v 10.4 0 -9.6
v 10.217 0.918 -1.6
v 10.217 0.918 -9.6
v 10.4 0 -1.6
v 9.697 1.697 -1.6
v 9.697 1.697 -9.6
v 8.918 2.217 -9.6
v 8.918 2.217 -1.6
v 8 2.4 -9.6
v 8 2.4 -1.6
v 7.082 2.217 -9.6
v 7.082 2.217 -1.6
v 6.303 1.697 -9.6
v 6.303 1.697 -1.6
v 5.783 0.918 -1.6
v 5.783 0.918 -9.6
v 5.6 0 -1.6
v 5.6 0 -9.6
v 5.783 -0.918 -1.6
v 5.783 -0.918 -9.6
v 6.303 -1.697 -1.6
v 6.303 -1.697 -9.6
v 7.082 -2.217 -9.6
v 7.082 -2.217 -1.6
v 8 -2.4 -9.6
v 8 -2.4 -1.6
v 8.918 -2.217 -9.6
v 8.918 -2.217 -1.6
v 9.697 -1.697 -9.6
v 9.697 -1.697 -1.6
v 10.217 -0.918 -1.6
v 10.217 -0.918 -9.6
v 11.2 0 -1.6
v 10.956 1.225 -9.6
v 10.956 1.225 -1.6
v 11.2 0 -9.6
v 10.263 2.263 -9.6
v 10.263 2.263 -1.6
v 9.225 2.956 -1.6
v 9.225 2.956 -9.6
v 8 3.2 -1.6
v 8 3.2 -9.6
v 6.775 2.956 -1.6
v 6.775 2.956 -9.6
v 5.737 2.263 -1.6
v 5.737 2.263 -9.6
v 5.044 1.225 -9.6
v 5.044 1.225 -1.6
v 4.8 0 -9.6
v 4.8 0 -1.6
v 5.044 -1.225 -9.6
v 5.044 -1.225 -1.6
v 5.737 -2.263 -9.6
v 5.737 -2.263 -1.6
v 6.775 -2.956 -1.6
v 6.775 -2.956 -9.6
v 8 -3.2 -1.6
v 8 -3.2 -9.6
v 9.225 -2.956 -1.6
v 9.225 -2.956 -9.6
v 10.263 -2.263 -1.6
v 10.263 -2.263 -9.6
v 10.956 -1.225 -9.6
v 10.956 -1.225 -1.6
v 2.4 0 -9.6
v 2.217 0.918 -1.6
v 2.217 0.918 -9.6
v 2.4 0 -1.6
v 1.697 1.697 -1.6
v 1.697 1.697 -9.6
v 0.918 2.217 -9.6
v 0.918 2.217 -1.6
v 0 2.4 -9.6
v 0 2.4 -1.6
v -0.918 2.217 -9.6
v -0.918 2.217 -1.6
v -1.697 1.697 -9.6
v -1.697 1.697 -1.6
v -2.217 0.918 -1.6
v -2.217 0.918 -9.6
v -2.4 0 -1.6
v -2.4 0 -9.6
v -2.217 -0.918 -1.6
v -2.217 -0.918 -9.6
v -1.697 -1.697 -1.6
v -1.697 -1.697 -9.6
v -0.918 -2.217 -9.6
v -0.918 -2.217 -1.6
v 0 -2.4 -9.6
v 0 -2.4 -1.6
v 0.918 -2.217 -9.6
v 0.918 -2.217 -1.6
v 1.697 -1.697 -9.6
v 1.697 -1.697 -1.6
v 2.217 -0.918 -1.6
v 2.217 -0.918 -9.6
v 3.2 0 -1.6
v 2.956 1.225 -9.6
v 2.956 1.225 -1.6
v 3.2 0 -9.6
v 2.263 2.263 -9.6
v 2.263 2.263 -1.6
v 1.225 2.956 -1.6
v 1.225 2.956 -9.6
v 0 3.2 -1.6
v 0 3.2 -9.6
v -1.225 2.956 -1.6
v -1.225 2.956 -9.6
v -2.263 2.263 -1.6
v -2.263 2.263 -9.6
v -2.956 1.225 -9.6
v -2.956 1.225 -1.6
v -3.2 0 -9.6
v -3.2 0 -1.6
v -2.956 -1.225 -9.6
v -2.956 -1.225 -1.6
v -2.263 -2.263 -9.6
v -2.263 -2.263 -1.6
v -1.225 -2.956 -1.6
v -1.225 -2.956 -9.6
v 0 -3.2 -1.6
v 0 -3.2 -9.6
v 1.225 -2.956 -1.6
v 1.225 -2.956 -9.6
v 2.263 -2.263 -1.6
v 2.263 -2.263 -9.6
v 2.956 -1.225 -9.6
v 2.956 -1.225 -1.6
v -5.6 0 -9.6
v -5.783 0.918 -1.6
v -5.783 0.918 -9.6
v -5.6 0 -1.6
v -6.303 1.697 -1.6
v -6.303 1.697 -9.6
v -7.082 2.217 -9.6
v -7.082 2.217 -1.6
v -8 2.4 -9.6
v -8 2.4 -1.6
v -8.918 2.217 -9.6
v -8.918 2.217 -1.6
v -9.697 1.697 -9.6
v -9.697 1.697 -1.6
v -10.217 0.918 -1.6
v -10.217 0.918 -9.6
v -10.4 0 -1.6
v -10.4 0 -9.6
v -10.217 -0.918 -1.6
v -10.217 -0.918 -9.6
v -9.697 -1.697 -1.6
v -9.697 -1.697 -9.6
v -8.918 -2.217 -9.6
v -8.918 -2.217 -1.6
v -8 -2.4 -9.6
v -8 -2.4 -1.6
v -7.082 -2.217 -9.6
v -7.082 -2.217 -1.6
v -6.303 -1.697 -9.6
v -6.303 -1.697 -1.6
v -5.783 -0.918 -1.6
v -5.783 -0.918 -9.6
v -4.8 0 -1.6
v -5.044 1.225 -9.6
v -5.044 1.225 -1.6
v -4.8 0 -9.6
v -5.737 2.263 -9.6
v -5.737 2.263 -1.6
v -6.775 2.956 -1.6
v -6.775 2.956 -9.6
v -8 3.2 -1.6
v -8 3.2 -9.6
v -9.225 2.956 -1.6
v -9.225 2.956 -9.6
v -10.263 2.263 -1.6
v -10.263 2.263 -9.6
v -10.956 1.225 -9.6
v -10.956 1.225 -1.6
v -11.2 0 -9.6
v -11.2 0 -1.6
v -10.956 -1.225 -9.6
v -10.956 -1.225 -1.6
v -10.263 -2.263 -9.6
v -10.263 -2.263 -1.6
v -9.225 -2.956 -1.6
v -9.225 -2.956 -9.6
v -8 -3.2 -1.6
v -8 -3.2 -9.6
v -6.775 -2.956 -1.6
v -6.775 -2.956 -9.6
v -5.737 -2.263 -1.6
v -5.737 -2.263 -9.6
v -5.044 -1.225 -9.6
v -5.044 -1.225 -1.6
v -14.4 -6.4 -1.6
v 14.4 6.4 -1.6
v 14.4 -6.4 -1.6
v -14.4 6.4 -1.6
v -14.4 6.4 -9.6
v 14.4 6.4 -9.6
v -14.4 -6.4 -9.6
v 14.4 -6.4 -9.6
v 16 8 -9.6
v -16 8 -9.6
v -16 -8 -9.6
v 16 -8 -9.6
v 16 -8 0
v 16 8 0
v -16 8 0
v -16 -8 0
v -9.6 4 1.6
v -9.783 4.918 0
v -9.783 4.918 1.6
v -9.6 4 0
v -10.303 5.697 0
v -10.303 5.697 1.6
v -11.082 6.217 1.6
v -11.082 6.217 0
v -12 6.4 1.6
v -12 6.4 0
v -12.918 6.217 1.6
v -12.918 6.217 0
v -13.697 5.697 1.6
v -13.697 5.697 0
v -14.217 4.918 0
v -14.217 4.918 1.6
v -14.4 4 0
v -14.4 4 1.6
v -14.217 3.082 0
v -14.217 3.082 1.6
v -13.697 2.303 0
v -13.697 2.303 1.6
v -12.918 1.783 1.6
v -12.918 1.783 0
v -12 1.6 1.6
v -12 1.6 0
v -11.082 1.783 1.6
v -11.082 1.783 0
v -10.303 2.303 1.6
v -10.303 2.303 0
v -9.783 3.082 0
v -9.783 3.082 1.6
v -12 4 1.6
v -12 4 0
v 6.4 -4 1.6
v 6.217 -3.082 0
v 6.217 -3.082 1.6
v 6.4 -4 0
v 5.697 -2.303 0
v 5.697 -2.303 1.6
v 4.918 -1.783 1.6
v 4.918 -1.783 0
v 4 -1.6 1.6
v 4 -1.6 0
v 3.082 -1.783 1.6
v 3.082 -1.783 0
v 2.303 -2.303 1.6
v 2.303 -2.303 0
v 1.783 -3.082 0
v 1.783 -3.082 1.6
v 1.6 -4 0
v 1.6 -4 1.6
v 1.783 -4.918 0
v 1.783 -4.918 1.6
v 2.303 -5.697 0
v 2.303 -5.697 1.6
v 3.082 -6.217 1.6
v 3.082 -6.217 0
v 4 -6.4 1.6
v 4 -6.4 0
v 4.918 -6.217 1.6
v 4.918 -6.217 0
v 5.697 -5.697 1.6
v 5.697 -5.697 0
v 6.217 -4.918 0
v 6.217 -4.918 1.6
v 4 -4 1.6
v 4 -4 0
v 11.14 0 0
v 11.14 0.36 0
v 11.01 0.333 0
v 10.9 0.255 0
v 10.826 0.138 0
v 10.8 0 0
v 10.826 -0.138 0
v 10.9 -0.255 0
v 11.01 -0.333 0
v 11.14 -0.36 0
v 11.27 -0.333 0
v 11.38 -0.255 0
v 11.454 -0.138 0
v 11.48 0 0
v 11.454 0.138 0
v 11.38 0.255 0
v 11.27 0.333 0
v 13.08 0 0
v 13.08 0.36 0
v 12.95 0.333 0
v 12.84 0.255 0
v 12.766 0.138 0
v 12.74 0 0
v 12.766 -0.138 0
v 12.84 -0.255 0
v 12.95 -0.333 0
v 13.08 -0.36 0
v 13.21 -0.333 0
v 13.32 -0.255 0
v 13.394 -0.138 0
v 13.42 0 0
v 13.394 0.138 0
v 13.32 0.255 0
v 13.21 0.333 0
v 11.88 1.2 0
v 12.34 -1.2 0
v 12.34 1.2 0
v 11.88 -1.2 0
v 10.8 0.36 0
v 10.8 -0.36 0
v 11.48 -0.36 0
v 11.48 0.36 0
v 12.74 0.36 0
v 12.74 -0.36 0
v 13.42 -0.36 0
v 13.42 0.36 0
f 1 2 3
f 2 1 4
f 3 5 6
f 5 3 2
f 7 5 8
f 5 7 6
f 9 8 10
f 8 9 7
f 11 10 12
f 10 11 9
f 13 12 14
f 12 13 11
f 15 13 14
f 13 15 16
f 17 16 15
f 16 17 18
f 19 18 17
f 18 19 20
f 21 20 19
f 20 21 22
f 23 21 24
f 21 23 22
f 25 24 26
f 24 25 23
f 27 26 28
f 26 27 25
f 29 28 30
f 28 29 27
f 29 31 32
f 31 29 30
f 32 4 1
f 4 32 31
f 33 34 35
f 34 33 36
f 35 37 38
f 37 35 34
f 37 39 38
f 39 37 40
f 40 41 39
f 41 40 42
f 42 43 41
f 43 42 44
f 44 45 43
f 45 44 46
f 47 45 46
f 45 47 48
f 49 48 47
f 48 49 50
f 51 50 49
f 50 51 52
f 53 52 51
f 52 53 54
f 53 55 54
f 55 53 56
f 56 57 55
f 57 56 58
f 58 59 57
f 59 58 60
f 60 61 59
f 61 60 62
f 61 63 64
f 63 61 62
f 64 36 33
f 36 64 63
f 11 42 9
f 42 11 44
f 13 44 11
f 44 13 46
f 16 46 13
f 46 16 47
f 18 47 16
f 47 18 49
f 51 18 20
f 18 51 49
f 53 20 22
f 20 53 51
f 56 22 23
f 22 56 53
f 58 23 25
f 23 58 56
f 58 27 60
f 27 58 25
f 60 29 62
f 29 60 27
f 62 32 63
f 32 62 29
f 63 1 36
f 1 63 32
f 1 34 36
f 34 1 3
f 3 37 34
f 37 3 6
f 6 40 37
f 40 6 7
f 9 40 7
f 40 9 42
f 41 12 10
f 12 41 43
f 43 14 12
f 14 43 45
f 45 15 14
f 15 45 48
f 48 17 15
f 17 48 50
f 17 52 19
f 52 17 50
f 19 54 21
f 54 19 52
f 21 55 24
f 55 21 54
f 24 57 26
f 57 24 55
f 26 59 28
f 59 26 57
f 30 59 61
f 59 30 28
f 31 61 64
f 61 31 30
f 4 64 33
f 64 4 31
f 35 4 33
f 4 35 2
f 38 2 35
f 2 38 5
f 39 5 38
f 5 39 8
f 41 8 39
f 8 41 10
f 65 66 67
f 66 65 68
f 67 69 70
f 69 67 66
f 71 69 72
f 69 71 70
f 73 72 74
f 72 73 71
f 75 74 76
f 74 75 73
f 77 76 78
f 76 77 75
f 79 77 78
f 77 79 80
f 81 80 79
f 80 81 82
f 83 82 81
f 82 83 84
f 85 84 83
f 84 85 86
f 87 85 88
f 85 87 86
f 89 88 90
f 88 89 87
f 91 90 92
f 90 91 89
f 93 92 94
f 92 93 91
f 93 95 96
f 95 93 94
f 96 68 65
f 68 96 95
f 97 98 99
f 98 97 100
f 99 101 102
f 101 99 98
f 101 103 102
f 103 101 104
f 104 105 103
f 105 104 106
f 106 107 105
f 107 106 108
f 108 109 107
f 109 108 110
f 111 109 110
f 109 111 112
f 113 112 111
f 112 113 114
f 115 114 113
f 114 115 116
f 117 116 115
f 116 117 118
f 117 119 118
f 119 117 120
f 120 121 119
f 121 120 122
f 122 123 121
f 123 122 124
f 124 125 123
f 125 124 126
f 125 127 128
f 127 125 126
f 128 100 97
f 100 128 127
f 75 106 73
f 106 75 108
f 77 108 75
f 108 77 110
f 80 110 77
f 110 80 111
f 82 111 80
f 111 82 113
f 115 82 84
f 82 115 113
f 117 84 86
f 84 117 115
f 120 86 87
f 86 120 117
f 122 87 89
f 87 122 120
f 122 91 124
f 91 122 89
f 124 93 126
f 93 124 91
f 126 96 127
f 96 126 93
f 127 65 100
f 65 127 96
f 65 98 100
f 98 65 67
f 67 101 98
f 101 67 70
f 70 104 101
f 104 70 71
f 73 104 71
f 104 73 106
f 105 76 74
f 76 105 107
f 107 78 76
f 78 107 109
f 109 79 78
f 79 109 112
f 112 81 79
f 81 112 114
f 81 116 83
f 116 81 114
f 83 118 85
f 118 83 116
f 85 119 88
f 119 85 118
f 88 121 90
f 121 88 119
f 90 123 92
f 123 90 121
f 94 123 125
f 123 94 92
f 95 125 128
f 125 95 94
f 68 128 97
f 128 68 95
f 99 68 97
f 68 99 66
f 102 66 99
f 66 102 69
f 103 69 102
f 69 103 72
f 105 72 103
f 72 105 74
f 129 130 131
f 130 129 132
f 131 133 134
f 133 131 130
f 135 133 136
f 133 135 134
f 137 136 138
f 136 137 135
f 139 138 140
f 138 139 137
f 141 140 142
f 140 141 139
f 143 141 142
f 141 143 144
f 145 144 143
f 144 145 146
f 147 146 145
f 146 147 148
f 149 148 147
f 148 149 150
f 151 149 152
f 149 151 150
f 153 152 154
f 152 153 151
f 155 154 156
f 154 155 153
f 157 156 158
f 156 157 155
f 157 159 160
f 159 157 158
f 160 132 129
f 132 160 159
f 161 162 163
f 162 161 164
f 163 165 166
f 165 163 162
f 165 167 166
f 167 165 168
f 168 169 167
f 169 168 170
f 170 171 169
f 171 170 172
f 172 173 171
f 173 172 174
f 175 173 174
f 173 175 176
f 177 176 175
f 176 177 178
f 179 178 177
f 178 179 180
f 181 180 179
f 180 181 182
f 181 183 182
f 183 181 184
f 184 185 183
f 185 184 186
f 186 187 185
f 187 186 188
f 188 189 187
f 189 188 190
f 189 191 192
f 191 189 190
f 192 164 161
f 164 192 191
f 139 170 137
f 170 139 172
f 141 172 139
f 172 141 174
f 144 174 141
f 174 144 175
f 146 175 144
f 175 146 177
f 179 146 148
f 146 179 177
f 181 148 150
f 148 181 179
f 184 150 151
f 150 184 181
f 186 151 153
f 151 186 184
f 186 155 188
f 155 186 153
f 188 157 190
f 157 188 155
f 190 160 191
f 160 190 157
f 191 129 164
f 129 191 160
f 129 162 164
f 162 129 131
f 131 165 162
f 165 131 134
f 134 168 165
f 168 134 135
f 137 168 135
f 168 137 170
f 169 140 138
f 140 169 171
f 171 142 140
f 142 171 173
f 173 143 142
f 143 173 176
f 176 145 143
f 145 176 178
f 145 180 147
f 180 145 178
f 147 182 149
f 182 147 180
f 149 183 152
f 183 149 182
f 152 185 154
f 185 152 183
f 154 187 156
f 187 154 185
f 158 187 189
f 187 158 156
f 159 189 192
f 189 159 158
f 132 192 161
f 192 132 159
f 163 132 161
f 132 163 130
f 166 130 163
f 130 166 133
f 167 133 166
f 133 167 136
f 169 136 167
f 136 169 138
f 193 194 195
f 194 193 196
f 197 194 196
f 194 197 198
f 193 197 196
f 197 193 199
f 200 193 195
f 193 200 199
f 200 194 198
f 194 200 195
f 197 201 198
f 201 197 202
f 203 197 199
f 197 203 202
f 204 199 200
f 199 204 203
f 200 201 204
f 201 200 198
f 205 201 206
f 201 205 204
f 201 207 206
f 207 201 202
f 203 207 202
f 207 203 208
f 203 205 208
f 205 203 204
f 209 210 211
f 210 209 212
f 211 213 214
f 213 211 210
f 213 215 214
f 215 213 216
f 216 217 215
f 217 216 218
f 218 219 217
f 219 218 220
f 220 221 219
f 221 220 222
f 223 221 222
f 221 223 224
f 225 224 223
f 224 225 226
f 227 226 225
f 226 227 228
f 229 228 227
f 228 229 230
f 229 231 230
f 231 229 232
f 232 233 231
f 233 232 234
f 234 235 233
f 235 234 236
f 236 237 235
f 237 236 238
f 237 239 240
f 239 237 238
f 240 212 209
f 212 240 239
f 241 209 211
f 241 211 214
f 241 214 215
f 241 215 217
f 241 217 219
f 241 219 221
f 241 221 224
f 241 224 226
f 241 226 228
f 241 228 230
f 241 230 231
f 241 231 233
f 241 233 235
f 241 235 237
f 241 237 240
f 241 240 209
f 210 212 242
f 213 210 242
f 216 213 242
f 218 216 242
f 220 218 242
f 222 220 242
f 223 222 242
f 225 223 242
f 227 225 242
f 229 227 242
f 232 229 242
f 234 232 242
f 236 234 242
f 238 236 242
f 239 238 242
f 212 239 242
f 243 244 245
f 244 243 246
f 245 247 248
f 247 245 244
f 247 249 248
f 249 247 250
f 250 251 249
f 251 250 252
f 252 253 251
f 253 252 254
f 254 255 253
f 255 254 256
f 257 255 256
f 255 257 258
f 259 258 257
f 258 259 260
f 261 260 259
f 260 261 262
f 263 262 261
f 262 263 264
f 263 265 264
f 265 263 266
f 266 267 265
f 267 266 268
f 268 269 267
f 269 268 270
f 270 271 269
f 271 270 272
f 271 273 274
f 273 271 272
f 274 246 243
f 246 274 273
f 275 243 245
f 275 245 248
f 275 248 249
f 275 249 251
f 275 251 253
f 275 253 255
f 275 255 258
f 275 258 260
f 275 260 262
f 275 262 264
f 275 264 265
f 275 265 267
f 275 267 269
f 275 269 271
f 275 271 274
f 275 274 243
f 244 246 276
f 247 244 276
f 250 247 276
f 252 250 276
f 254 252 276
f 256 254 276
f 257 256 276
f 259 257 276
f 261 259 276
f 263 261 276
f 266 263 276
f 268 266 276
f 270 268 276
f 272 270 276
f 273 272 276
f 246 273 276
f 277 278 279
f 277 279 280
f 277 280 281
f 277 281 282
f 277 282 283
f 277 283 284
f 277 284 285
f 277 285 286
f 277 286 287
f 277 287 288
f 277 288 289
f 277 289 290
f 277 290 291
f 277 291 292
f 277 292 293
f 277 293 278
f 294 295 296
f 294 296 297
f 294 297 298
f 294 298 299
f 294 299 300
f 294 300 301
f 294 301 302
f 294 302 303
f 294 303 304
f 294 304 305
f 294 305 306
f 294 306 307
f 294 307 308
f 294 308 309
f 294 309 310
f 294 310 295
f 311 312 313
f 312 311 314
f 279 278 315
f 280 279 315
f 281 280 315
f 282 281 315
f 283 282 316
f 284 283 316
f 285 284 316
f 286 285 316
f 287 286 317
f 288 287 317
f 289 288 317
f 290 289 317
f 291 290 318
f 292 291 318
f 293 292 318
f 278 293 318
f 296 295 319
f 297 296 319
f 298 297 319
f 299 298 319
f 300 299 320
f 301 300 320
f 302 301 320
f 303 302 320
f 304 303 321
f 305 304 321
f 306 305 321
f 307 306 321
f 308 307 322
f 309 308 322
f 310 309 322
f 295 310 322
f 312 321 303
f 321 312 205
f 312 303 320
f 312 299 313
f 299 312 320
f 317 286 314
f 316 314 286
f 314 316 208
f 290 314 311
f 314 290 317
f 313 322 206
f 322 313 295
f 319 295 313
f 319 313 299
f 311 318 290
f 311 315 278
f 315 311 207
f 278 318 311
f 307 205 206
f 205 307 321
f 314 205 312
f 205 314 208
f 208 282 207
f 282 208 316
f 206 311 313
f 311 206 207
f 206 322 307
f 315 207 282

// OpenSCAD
// file: ../p/4-4ring3.scad
use <../lib.scad>
$fa=1; $fs=0.2;
function ldraw_lib__4_4ring3(realsolid=false) = [
// 0 Ring  3 x 1.0
// 0 Name: 4-4ring3.dat
// 0 Author: James Jessiman
// 0 !LDRAW_ORG Primitive UPDATE 2009-01
// 0 !LICENSE Licensed under CC BY 2.0 and CC BY 4.0 : see CAreadme.txt
// 
// 0 BFC CERTIFY CCW
  [0,"BFC","CERTIFY"],
  [0,"BFC","CCW"],
// 
// 0 !HISTORY 1998-12-15 [PTadmin] Official Update 1998-10
// 0 !HISTORY 2002-04-05 [hafhead] Added BFC statement
// 0 !HISTORY 2002-04-25 [PTadmin] Official Update 2002-02
// 0 !HISTORY 2007-06-24 [PTadmin] Header formatted for Contributor Agreement
// 0 !HISTORY 2008-07-01 [PTadmin] Official Update 2008-01
// 0 !HISTORY 2008-08-26 [cwdee] Switch polygon winding and rename
// 0 !HISTORY 2009-05-02 [PTadmin] Official Update 2009-01
// 
// 
// 4 16 -1.5308 0 3.6956 -1.1481 0 2.7717 0 0 3 0 0 4
  [4,16,-1.5308,0,3.6956,-1.1481,0,2.7717,0,0,3,0,0,4],
// 4 16 -2.8284 0 2.8284 -2.1213 0 2.1213 -1.1481 0 2.7717 -1.5308 0 3.6956
  [4,16,-2.8284,0,2.8284,-2.1213,0,2.1213,-1.1481,0,2.7717,-1.5308,0,3.6956],
// 4 16 -3.6956 0 1.5308 -2.7717 0 1.1481 -2.1213 0 2.1213 -2.8284 0 2.8284
  [4,16,-3.6956,0,1.5308,-2.7717,0,1.1481,-2.1213,0,2.1213,-2.8284,0,2.8284],
// 4 16 -4 0 0 -3 0 0 -2.7717 0 1.1481 -3.6956 0 1.5308
  [4,16,-4,0,0,-3,0,0,-2.7717,0,1.1481,-3.6956,0,1.5308],
// 4 16 -3.6956 0 -1.5308 -2.7717 0 -1.1481 -3 0 0 -4 0 0
  [4,16,-3.6956,0,-1.5308,-2.7717,0,-1.1481,-3,0,0,-4,0,0],
// 4 16 -2.8284 0 -2.8284 -2.1213 0 -2.1213 -2.7717 0 -1.1481 -3.6956 0 -1.5308
  [4,16,-2.8284,0,-2.8284,-2.1213,0,-2.1213,-2.7717,0,-1.1481,-3.6956,0,-1.5308],
// 4 16 -1.5308 0 -3.6956 -1.1481 0 -2.7717 -2.1213 0 -2.1213 -2.8284 0 -2.8284
  [4,16,-1.5308,0,-3.6956,-1.1481,0,-2.7717,-2.1213,0,-2.1213,-2.8284,0,-2.8284],
// 4 16 0 0 -4 0 0 -3 -1.1481 0 -2.7717 -1.5308 0 -3.6956
  [4,16,0,0,-4,0,0,-3,-1.1481,0,-2.7717,-1.5308,0,-3.6956],
// 4 16 1.5308 0 -3.6956 1.1481 0 -2.7717 0 0 -3 0 0 -4
  [4,16,1.5308,0,-3.6956,1.1481,0,-2.7717,0,0,-3,0,0,-4],
// 4 16 2.8284 0 -2.8284 2.1213 0 -2.1213 1.1481 0 -2.7717 1.5308 0 -3.6956
  [4,16,2.8284,0,-2.8284,2.1213,0,-2.1213,1.1481,0,-2.7717,1.5308,0,-3.6956],
// 4 16 3.6956 0 -1.5308 2.7717 0 -1.1481 2.1213 0 -2.1213 2.8284 0 -2.8284
  [4,16,3.6956,0,-1.5308,2.7717,0,-1.1481,2.1213,0,-2.1213,2.8284,0,-2.8284],
// 4 16 4 0 0 3 0 0 2.7717 0 -1.1481 3.6956 0 -1.5308
  [4,16,4,0,0,3,0,0,2.7717,0,-1.1481,3.6956,0,-1.5308],
// 4 16 3.6956 0 1.5308 2.7717 0 1.1481 3 0 0 4 0 0
  [4,16,3.6956,0,1.5308,2.7717,0,1.1481,3,0,0,4,0,0],
// 4 16 2.8284 0 2.8284 2.1213 0 2.1213 2.7717 0 1.1481 3.6956 0 1.5308
  [4,16,2.8284,0,2.8284,2.1213,0,2.1213,2.7717,0,1.1481,3.6956,0,1.5308],
// 4 16 1.5308 0 3.6956 1.1481 0 2.7717 2.1213 0 2.1213 2.8284 0 2.8284
  [4,16,1.5308,0,3.6956,1.1481,0,2.7717,2.1213,0,2.1213,2.8284,0,2.8284],
// 4 16 0 0 4 0 0 3 1.1481 0 2.7717 1.5308 0 3.6956
  [4,16,0,0,4,0,0,3,1.1481,0,2.7717,1.5308,0,3.6956],
// 0
];
module ldraw_lib__4_4ring3(step=0, col=false, unit=2/5, alt=false, line=0.2, solid=!$preview)
    makepoly(ldraw_lib__4_4ring3(solid), step=step, col=col, unit=unit, alt=alt, line=line, solid=solid);
ldraw_lib__4_4ring3(line=0.2);
// file: ../p/4-4edge.scad
use <../lib.scad>
function ldraw_lib__4_4edge() = [
// 0 Circle 1.0
// 0 Name: 4-4edge.dat
// 0 Author: James Jessiman
// 0 !LDRAW_ORG Primitive UPDATE 2017-01
// 0 !LICENSE Licensed under CC BY 2.0 and CC BY 4.0 : see CAreadme.txt
// 
// 0 BFC CERTIFY CCW
  [0,"BFC","CERTIFY"],
  [0,"BFC","CCW"],
// 
// 0 !HISTORY 1998-12-15 [PTadmin] Official Update 1998-10
// 0 !HISTORY 2005-12-28 [PTadmin] Official Update 2005-01
// 0 !HISTORY 2007-06-24 [PTadmin] Header formatted for Contributor Agreement
// 0 !HISTORY 2008-07-01 [PTadmin] Official Update 2008-01
// 0 !HISTORY 2017-01-15 [Steffen] BFCed
// 0 !HISTORY 2017-12-30 [PTadmin] Official Update 2017-01
// 
// 
// 2 24 1 0 0 0.9239 0 0.3827
  [2,24,1,0,0,0.9239,0,0.3827],
// 2 24 0.9239 0 0.3827 0.7071 0 0.7071
  [2,24,0.9239,0,0.3827,0.7071,0,0.7071],
// 2 24 0.7071 0 0.7071 0.3827 0 0.9239
  [2,24,0.7071,0,0.7071,0.3827,0,0.9239],
// 2 24 0.3827 0 0.9239 0 0 1
  [2,24,0.3827,0,0.9239,0,0,1],
// 2 24 0 0 1 -0.3827 0 0.9239
  [2,24,0,0,1,-0.3827,0,0.9239],
// 2 24 -0.3827 0 0.9239 -0.7071 0 0.7071
  [2,24,-0.3827,0,0.9239,-0.7071,0,0.7071],
// 2 24 -0.7071 0 0.7071 -0.9239 0 0.3827
  [2,24,-0.7071,0,0.7071,-0.9239,0,0.3827],
// 2 24 -0.9239 0 0.3827 -1 0 -0
  [2,24,-0.9239,0,0.3827,-1,0,-0],
// 2 24 -1 0 -0 -0.9239 0 -0.3827
  [2,24,-1,0,-0,-0.9239,0,-0.3827],
// 2 24 -0.9239 0 -0.3827 -0.7071 0 -0.7071
  [2,24,-0.9239,0,-0.3827,-0.7071,0,-0.7071],
// 2 24 -0.7071 0 -0.7071 -0.3827 0 -0.9239
  [2,24,-0.7071,0,-0.7071,-0.3827,0,-0.9239],
// 2 24 -0.3827 0 -0.9239 0 0 -1
  [2,24,-0.3827,0,-0.9239,0,0,-1],
// 2 24 0 0 -1 0.3827 0 -0.9239
  [2,24,0,0,-1,0.3827,0,-0.9239],
// 2 24 0.3827 0 -0.9239 0.7071 0 -0.7071
  [2,24,0.3827,0,-0.9239,0.7071,0,-0.7071],
// 2 24 0.7071 0 -0.7071 0.9239 0 -0.3827
  [2,24,0.7071,0,-0.7071,0.9239,0,-0.3827],
// 2 24 0.9239 0 -0.3827 1 0 0
  [2,24,0.9239,0,-0.3827,1,0,0],
];
module ldraw_lib__4_4edge(step=0, col=false, unit=2/5, alt=false, line=0.2, solid=!$preview)
    makepoly(ldraw_lib__4_4edge(), step=step, col=col, unit=unit, alt=alt, line=line, solid=solid);
ldraw_lib__4_4edge(line=0.2);
// file: ../p/4-4cyli.scad
use <../lib.scad>
$fa=1; $fs=0.2;
function ldraw_lib__4_4cyli(realsolid=false) = [
// 0 Cylinder 1.0
// 0 Name: 4-4cyli.dat
// 0 Author: James Jessiman
// 0 !LDRAW_ORG Primitive UPDATE 2005-01
// 0 !LICENSE Licensed under CC BY 2.0 and CC BY 4.0 : see CAreadme.txt
// 
// 0 BFC CERTIFY CCW
  [0,"BFC","CERTIFY"],
  [0,"BFC","CCW"],
// 
// 0 !HISTORY 1998-12-15 [PTadmin] Official Update 1998-10
// 0 !HISTORY 2002-03-23 [sbliss] Added BFC statement; merged headers from files in distributions LDraw 0.27 and Complete.
// 0 !HISTORY 2002-04-25 [PTadmin] Official Update 2002-02
// 0 !HISTORY 2004-12-14 [guyvivan] BFC CCW
// 0 !HISTORY 2005-12-28 [PTadmin] Official Update 2005-01
// 0 !HISTORY 2007-06-24 [PTadmin] Header formatted for Contributor Agreement
// 0 !HISTORY 2008-07-01 [PTadmin] Official Update 2008-01
// 
// 
// 4 16 1 1 0 0.9239 1 0.3827 0.9239 0 0.3827 1 0 0
  [4,16,1,1,0,0.9239,1,0.3827,0.9239,0,0.3827,1,0,0],
// 5 24 1 0 0 1 1 0 0.9239 0 0.3827 0.9239 0 -0.3827
  [5,24,1,0,0,1,1,0,0.9239,0,0.3827,0.9239,0,-0.3827],
// 4 16 0.9239 1 0.3827 0.7071 1 0.7071 0.7071 0 0.7071 0.9239 0 0.3827
  [4,16,0.9239,1,0.3827,0.7071,1,0.7071,0.7071,0,0.7071,0.9239,0,0.3827],
// 5 24 0.9239 0 0.3827 0.9239 1 0.3827 0.7071 0 0.7071 1 0 0
  [5,24,0.9239,0,0.3827,0.9239,1,0.3827,0.7071,0,0.7071,1,0,0],
// 4 16 0.7071 1 0.7071 0.3827 1 0.9239 0.3827 0 0.9239 0.7071 0 0.7071
  [4,16,0.7071,1,0.7071,0.3827,1,0.9239,0.3827,0,0.9239,0.7071,0,0.7071],
// 5 24 0.7071 0 0.7071 0.7071 1 0.7071 0.3827 0 0.9239 0.9239 0 0.3827
  [5,24,0.7071,0,0.7071,0.7071,1,0.7071,0.3827,0,0.9239,0.9239,0,0.3827],
// 4 16 0.3827 1 0.9239 0 1 1 0 0 1 0.3827 0 0.9239
  [4,16,0.3827,1,0.9239,0,1,1,0,0,1,0.3827,0,0.9239],
// 5 24 0.3827 0 0.9239 0.3827 1 0.9239 0 0 1 0.7071 0 0.7071
  [5,24,0.3827,0,0.9239,0.3827,1,0.9239,0,0,1,0.7071,0,0.7071],
// 4 16 0 1 1 -0.3827 1 0.9239 -0.3827 0 0.9239 0 0 1
  [4,16,0,1,1,-0.3827,1,0.9239,-0.3827,0,0.9239,0,0,1],
// 5 24 0 0 1 0 1 1 -0.3827 0 0.9239 0.3827 0 0.9239
  [5,24,0,0,1,0,1,1,-0.3827,0,0.9239,0.3827,0,0.9239],
// 4 16 -0.3827 1 0.9239 -0.7071 1 0.7071 -0.7071 0 0.7071 -0.3827 0 0.9239
  [4,16,-0.3827,1,0.9239,-0.7071,1,0.7071,-0.7071,0,0.7071,-0.3827,0,0.9239],
// 5 24 -0.3827 0 0.9239 -0.3827 1 0.9239 -0.7071 0 0.7071 0 0 1
  [5,24,-0.3827,0,0.9239,-0.3827,1,0.9239,-0.7071,0,0.7071,0,0,1],
// 4 16 -0.7071 1 0.7071 -0.9239 1 0.3827 -0.9239 0 0.3827 -0.7071 0 0.7071
  [4,16,-0.7071,1,0.7071,-0.9239,1,0.3827,-0.9239,0,0.3827,-0.7071,0,0.7071],
// 5 24 -0.7071 0 0.7071 -0.7071 1 0.7071 -0.9239 0 0.3827 -0.3827 0 0.9239
  [5,24,-0.7071,0,0.7071,-0.7071,1,0.7071,-0.9239,0,0.3827,-0.3827,0,0.9239],
// 4 16 -0.9239 1 0.3827 -1 1 0 -1 0 0 -0.9239 0 0.3827
  [4,16,-0.9239,1,0.3827,-1,1,0,-1,0,0,-0.9239,0,0.3827],
// 5 24 -0.9239 0 0.3827 -0.9239 1 0.3827 -1 0 0 -0.7071 0 0.7071
  [5,24,-0.9239,0,0.3827,-0.9239,1,0.3827,-1,0,0,-0.7071,0,0.7071],
// 4 16 -1 1 0 -0.9239 1 -0.3827 -0.9239 0 -0.3827 -1 0 0
  [4,16,-1,1,0,-0.9239,1,-0.3827,-0.9239,0,-0.3827,-1,0,0],
// 5 24 -1 0 0 -1 1 0 -0.9239 0 -0.3827 -0.9239 0 0.3827
  [5,24,-1,0,0,-1,1,0,-0.9239,0,-0.3827,-0.9239,0,0.3827],
// 4 16 -0.9239 1 -0.3827 -0.7071 1 -0.7071 -0.7071 0 -0.7071 -0.9239 0 -0.3827
  [4,16,-0.9239,1,-0.3827,-0.7071,1,-0.7071,-0.7071,0,-0.7071,-0.9239,0,-0.3827],
// 5 24 -0.9239 0 -0.3827 -0.9239 1 -0.3827 -0.7071 0 -0.7071 -1 0 0
  [5,24,-0.9239,0,-0.3827,-0.9239,1,-0.3827,-0.7071,0,-0.7071,-1,0,0],
// 4 16 -0.7071 1 -0.7071 -0.3827 1 -0.9239 -0.3827 0 -0.9239 -0.7071 0 -0.7071
  [4,16,-0.7071,1,-0.7071,-0.3827,1,-0.9239,-0.3827,0,-0.9239,-0.7071,0,-0.7071],
// 5 24 -0.7071 0 -0.7071 -0.7071 1 -0.7071 -0.3827 0 -0.9239 -0.9239 0 -0.3827
  [5,24,-0.7071,0,-0.7071,-0.7071,1,-0.7071,-0.3827,0,-0.9239,-0.9239,0,-0.3827],
// 4 16 -0.3827 1 -0.9239 0 1 -1 0 0 -1 -0.3827 0 -0.9239
  [4,16,-0.3827,1,-0.9239,0,1,-1,0,0,-1,-0.3827,0,-0.9239],
// 5 24 -0.3827 0 -0.9239 -0.3827 1 -0.9239 0 0 -1 -0.7071 0 -0.7071
  [5,24,-0.3827,0,-0.9239,-0.3827,1,-0.9239,0,0,-1,-0.7071,0,-0.7071],
// 4 16 0 1 -1 0.3827 1 -0.9239 0.3827 0 -0.9239 0 0 -1
  [4,16,0,1,-1,0.3827,1,-0.9239,0.3827,0,-0.9239,0,0,-1],
// 5 24 0 0 -1 0 1 -1 0.3827 0 -0.9239 -0.3827 0 -0.9239
  [5,24,0,0,-1,0,1,-1,0.3827,0,-0.9239,-0.3827,0,-0.9239],
// 4 16 0.3827 1 -0.9239 0.7071 1 -0.7071 0.7071 0 -0.7071 0.3827 0 -0.9239
  [4,16,0.3827,1,-0.9239,0.7071,1,-0.7071,0.7071,0,-0.7071,0.3827,0,-0.9239],
// 5 24 0.3827 0 -0.9239 0.3827 1 -0.9239 0.7071 0 -0.7071 0 0 -1
  [5,24,0.3827,0,-0.9239,0.3827,1,-0.9239,0.7071,0,-0.7071,0,0,-1],
// 4 16 0.7071 1 -0.7071 0.9239 1 -0.3827 0.9239 0 -0.3827 0.7071 0 -0.7071
  [4,16,0.7071,1,-0.7071,0.9239,1,-0.3827,0.9239,0,-0.3827,0.7071,0,-0.7071],
// 5 24 0.7071 0 -0.7071 0.7071 1 -0.7071 0.9239 0 -0.3827 0.3827 0 -0.9239
  [5,24,0.7071,0,-0.7071,0.7071,1,-0.7071,0.9239,0,-0.3827,0.3827,0,-0.9239],
// 4 16 0.9239 1 -0.3827 1 1 0 1 0 0 0.9239 0 -0.3827
  [4,16,0.9239,1,-0.3827,1,1,0,1,0,0,0.9239,0,-0.3827],
// 5 24 0.9239 0 -0.3827 0.9239 1 -0.3827 1 0 0 0.7071 0 -0.7071
  [5,24,0.9239,0,-0.3827,0.9239,1,-0.3827,1,0,0,0.7071,0,-0.7071],
// 0
];
module ldraw_lib__4_4cyli(step=0, col=false, unit=2/5, alt=false, line=0.2, solid=!$preview)
    makepoly(ldraw_lib__4_4cyli(solid), step=step, col=col, unit=unit, alt=alt, line=line, solid=solid);
ldraw_lib__4_4cyli(line=0.2);
// file: ../p/stud4.scad
use <../lib.scad>
use <4-4cyli.scad>
use <4-4edge.scad>
use <4-4ring3.scad>
function ldraw_lib__stud4() = [
// 0 Stud Tube Open
// 0 Name: stud4.dat
// 0 Author: James Jessiman
// 0 !LDRAW_ORG Primitive UPDATE 2009-02
// 0 !LICENSE Licensed under CC BY 4.0 : see CAreadme.txt
// 
// 0 BFC CERTIFY CCW
  [0,"BFC","CERTIFY"],
  [0,"BFC","CCW"],
// 
// 0 !HISTORY 1999-07-05 [PTadmin] Official Update 1999-05
// 0 !HISTORY 2002-04-04 [sbliss] Modified for BFC compliance
// 0 !HISTORY 2002-04-25 [PTadmin] Official Update 2002-02
// 0 !HISTORY 2007-06-24 [PTadmin] Header formatted for Contributor Agreement
// 0 !HISTORY 2008-07-01 [PTadmin] Official Update 2008-01
// 0 !HISTORY 2009-06-21 [cwdee] Update ring references to 4-4ring
// 0 !HISTORY 2009-09-03 [PTadmin] Official Update 2009-02
// 
// 
// 1 16 0 -4 0 6 0 0 0 1 0 0 0 6 4-4edge.dat
  [1,16,0,-4,0,6,0,0,0,1,0,0,0,6, ldraw_lib__4_4edge()],
// 1 16 0 -4 0 8 0 0 0 1 0 0 0 8 4-4edge.dat
  [1,16,0,-4,0,8,0,0,0,1,0,0,0,8, ldraw_lib__4_4edge()],
// 1 16 0 0 0 6 0 0 0 1 0 0 0 6 4-4edge.dat
  [1,16,0,0,0,6,0,0,0,1,0,0,0,6, ldraw_lib__4_4edge()],
// 1 16 0 0 0 8 0 0 0 1 0 0 0 8 4-4edge.dat
  [1,16,0,0,0,8,0,0,0,1,0,0,0,8, ldraw_lib__4_4edge()],
// 0 BFC INVERTNEXT
  [0,"BFC","INVERTNEXT"],
// 1 16 0 -4 0 6 0 0 0 4 0 0 0 6 4-4cyli.dat
  [1,16,0,-4,0,6,0,0,0,4,0,0,0,6, ldraw_lib__4_4cyli()],
// 1 16 0 -4 0 8 0 0 0 4 0 0 0 8 4-4cyli.dat
  [1,16,0,-4,0,8,0,0,0,4,0,0,0,8, ldraw_lib__4_4cyli()],
// 1 16 0 -4 0 2 0 0 0 1 0 0 0 2 4-4ring3.dat
  [1,16,0,-4,0,2,0,0,0,1,0,0,0,2, ldraw_lib__4_4ring3()],
  [-1,16,0,0,0,2,0,0,0,-1,0,0,0,2, ldraw_lib__4_4ring3()],
// 0
];
module ldraw_lib__stud4(step=0, col=false, unit=2/5, alt=false, line=0.2, solid=!$preview)
    makepoly(ldraw_lib__stud4(), step=step, col=col, unit=unit, alt=alt, line=line, solid=solid);
ldraw_lib__stud4(line=0.2);
// file: ../p/box5.scad
use <../lib.scad>
function ldraw_lib__box5() = [
// 0 Box with 5 Faces and All Edges
// 0 Name: box5.dat
// 0 Author: James Jessiman
// 0 !LDRAW_ORG Primitive UPDATE 2012-01
// 0 !LICENSE Licensed under CC BY 2.0 and CC BY 4.0 : see CAreadme.txt
// 
// 0 BFC CERTIFY CCW
  [0,"BFC","CERTIFY"],
  [0,"BFC","CCW"],
// 
// 0 !HISTORY 2002-04-03 [sbliss] Modified for BFC compliance
// 0 !HISTORY 2002-04-25 [PTadmin] Official Update 2002-02
// 0 !HISTORY 2007-06-24 [PTadmin] Header formatted for Contributor Agreement
// 0 !HISTORY 2008-07-01 [PTadmin] Official Update 2008-01
// 0 !HISTORY 2012-02-16 [Philo] Changed to CCW
// 0 !HISTORY 2012-03-30 [PTadmin] Official Update 2012-01
// 
// 
// 2 24 1 1 1 -1 1 1
  [2,24,1,1,1,-1,1,1],
// 2 24 -1 1 1 -1 1 -1
  [2,24,-1,1,1,-1,1,-1],
// 2 24 -1 1 -1 1 1 -1
  [2,24,-1,1,-1,1,1,-1],
// 2 24 1 1 -1 1 1 1
  [2,24,1,1,-1,1,1,1],
// 2 24 1 0 1 -1 0 1
  [2,24,1,0,1,-1,0,1],
// 2 24 -1 0 1 -1 0 -1
  [2,24,-1,0,1,-1,0,-1],
// 2 24 -1 0 -1 1 0 -1
  [2,24,-1,0,-1,1,0,-1],
// 2 24 1 0 -1 1 0 1
  [2,24,1,0,-1,1,0,1],
// 2 24 1 0 1 1 1 1
  [2,24,1,0,1,1,1,1],
// 2 24 -1 0 1 -1 1 1
  [2,24,-1,0,1,-1,1,1],
// 2 24 1 0 -1 1 1 -1
  [2,24,1,0,-1,1,1,-1],
// 2 24 -1 0 -1 -1 1 -1
  [2,24,-1,0,-1,-1,1,-1],
// 4 16 -1 1 1 1 1 1 1 1 -1 -1 1 -1
  [4,16,-1,1,1,1,1,1,1,1,-1,-1,1,-1],
// 4 16 -1 1 1 -1 0 1 1 0 1 1 1 1
  [4,16,-1,1,1,-1,0,1,1,0,1,1,1,1],
// 4 16 -1 1 -1 -1 0 -1 -1 0 1 -1 1 1
  [4,16,-1,1,-1,-1,0,-1,-1,0,1,-1,1,1],
// 4 16 1 1 -1 1 0 -1 -1 0 -1 -1 1 -1
  [4,16,1,1,-1,1,0,-1,-1,0,-1,-1,1,-1],
// 4 16 1 1 1 1 0 1 1 0 -1 1 1 -1
  [4,16,1,1,1,1,0,1,1,0,-1,1,1,-1],
];
makepoly(ldraw_lib__box5(), line=0.2);
// file: ../p/box4.scad
use <../lib.scad>
function ldraw_lib__box4() = [
// 0 Box with 4 Faces (2 Parallel Pairs) and All Edges
// 0 Name: box4.dat
// 0 Author: James Jessiman
// 0 !LDRAW_ORG Primitive UPDATE 2012-01
// 0 !LICENSE Licensed under CC BY 4.0 : see CAreadme.txt
// 
// 0 BFC CERTIFY CCW
  [0,"BFC","CERTIFY"],
  [0,"BFC","CCW"],
// 
// 0 !HISTORY 2002-04-03 [sbliss] Modified for BFC compliance
// 0 !HISTORY 2002-04-25 [PTadmin] Official Update 2002-02
// 0 !HISTORY 2007-06-24 [PTadmin] Header formatted for Contributor Agreement
// 0 !HISTORY 2008-07-01 [PTadmin] Official Update 2008-01
// 0 !HISTORY 2012-02-16 [Philo] Changed to CCW
// 0 !HISTORY 2012-03-30 [PTadmin] Official Update 2012-01
// 
// 
// 2 24 1 1 1 -1 1 1
  [2,24,1,1,1,-1,1,1],
// 2 24 -1 1 1 -1 1 -1
  [2,24,-1,1,1,-1,1,-1],
// 2 24 -1 1 -1 1 1 -1
  [2,24,-1,1,-1,1,1,-1],
// 2 24 1 1 -1 1 1 1
  [2,24,1,1,-1,1,1,1],
// 2 24 1 0 1 -1 0 1
  [2,24,1,0,1,-1,0,1],
// 2 24 -1 0 1 -1 0 -1
  [2,24,-1,0,1,-1,0,-1],
// 2 24 -1 0 -1 1 0 -1
  [2,24,-1,0,-1,1,0,-1],
// 2 24 1 0 -1 1 0 1
  [2,24,1,0,-1,1,0,1],
// 2 24 1 0 1 1 1 1
  [2,24,1,0,1,1,1,1],
// 2 24 -1 0 1 -1 1 1
  [2,24,-1,0,1,-1,1,1],
// 2 24 1 0 -1 1 1 -1
  [2,24,1,0,-1,1,1,-1],
// 2 24 -1 0 -1 -1 1 -1
  [2,24,-1,0,-1,-1,1,-1],
// 4 16 -1 1 1 -1 0 1 1 0 1 1 1 1
  [4,16,-1,1,1,-1,0,1,1,0,1,1,1,1],
// 4 16 -1 1 -1 -1 0 -1 -1 0 1 -1 1 1
  [4,16,-1,1,-1,-1,0,-1,-1,0,1,-1,1,1],
// 4 16 1 1 -1 1 0 -1 -1 0 -1 -1 1 -1
  [4,16,1,1,-1,1,0,-1,-1,0,-1,-1,1,-1],
// 4 16 1 1 1 1 0 1 1 0 -1 1 1 -1
  [4,16,1,1,1,1,0,1,1,0,-1,1,1,-1],
];
module ldraw_lib__box4(step=0, col=false, unit=2/5, alt=false, line=0.2, solid=!$preview)
    makepoly(ldraw_lib__box4(), step=step, col=col, unit=unit, alt=alt, line=line, solid=solid);
ldraw_lib__box4(line=0.2);
// file: ../p/stud.scad
use <../lib.scad>
use <4-4cyli.scad>
use <4-4disc.scad>
use <4-4edge.scad>
function ldraw_lib__stud() = [
// 0 Stud
// 0 Name: stud.dat
// 0 Author: James Jessiman
// 0 !LDRAW_ORG Primitive UPDATE 2012-01
// 0 !LICENSE Licensed under CC BY 4.0 : see CAreadme.txt
// 
// 0 BFC CERTIFY CCW
  [0,"BFC","CERTIFY"],
  [0,"BFC","CCW"],
// 
// 0 !HISTORY 2002-04-04 [sbliss] Modified for BFC compliance
// 0 !HISTORY 2002-04-25 [PTadmin] Official Update 2002-02
// 0 !HISTORY 2007-06-24 [PTadmin] Header formatted for Contributor Agreement
// 0 !HISTORY 2008-07-01 [PTadmin] Official Update 2008-01
// 0 !HISTORY 2012-02-16 [Philo] Changed to CCW
// 0 !HISTORY 2012-03-30 [PTadmin] Official Update 2012-01
// 
// 
// 1 16 0 0 0 6 0 0 0 1 0 0 0 6 4-4edge.dat
  [1,16,0,0,0,6,0,0,0,1,0,0,0,6, ldraw_lib__4_4edge()],
// 1 16 0 -4 0 6 0 0 0 1 0 0 0 6 4-4edge.dat
  [1,16,0,-4,0,6,0,0,0,1,0,0,0,6, ldraw_lib__4_4edge()],
// 1 16 0 0 0 6 0 0 0 -4 0 0 0 6 4-4cyli.dat
  [1,16,0,0,0,6,0,0,0,-4,0,0,0,6, ldraw_lib__4_4cyli()],
// 1 16 0 -4 0 6 0 0 0 1 0 0 0 6 4-4disc.dat
  [1,16,0,-4,0,6,0,0,0,1,0,0,0,6, ldraw_lib__4_4disc()],
  [-1,16,0,0,0,6,0,0,0,-1,0,0,0,6, ldraw_lib__4_4disc()],
];
module ldraw_lib__stud(step=0, col=false, unit=2/5, alt=false, line=0.2, solid=!$preview)
    makepoly(ldraw_lib__stud(), step=step, col=col, unit=unit, alt=alt, line=line, solid=solid);
ldraw_lib__stud(line=0.2);
// file: s/3001s02.scad
use <../../lib.scad>
use <../../p/box4.scad>
use <../../p/box5.scad>
use <../../p/stud4.scad>
function ldraw_lib__s__3001s02() = [
// 0 ~Brick  2 x  4 without Top and Top Studs
// 0 Name: s\3001s02.dat
// 0 Author: Rene Rechthaler [Blechtaler]
// 0 !LDRAW_ORG Subpart UPDATE 2024-09
// 0 !LICENSE Licensed under CC BY 4.0 : see CAreadme.txt
// 
// 0 BFC CERTIFY CCW
  [0,"BFC","CERTIFY"],
  [0,"BFC","CCW"],
// 
// 0 !HISTORY 2023-11-20 [Blechtaler] made from 3001s01
// 0 !HISTORY 2024-10-27 [OrionP] Official Update 2024-09
// 
// 1 16 20 4 0 1 0 0 0 -5 0 0 0 1 stud4.dat
  [1,16,20,4,0,1,0,0,0,-5,0,0,0,1, ldraw_lib__stud4()],
// 1 16 0 4 0 1 0 0 0 -5 0 0 0 1 stud4.dat
  [1,16,0,4,0,1,0,0,0,-5,0,0,0,1, ldraw_lib__stud4()],
// 1 16 -20 4 0 1 0 0 0 -5 0 0 0 1 stud4.dat
  [1,16,-20,4,0,1,0,0,0,-5,0,0,0,1, ldraw_lib__stud4()],
// 0 BFC INVERTNEXT
  [0,"BFC","INVERTNEXT"],
// 1 16 0 24 0 36 0 0 0 -20 0 0 0 16 box5.dat
  [1,16,0,24,0,36,0,0,0,-20,0,0,0,16, ldraw_lib__box5()],
// 4 16 40 24 20 36 24 16 -36 24 16 -40 24 20
  [4,16,40,24,20,36,24,16,-36,24,16,-40,24,20],
// 4 16 -40 24 20 -36 24 16 -36 24 -16 -40 24 -20
  [4,16,-40,24,20,-36,24,16,-36,24,-16,-40,24,-20],
// 4 16 -40 24 -20 -36 24 -16 36 24 -16 40 24 -20
  [4,16,-40,24,-20,-36,24,-16,36,24,-16,40,24,-20],
// 4 16 40 24 -20 36 24 -16 36 24 16 40 24 20
  [4,16,40,24,-20,36,24,-16,36,24,16,40,24,20],
// 1 16 0 24 0 0 0 40 0 -24 0 -20 0 0 box4.dat
  [1,16,0,24,0,0,0,40,0,-24,0,-20,0,0, ldraw_lib__box4()],
];
module ldraw_lib__s__3001s02(step=0, col=false, unit=2/5, alt=false, line=0.2, solid=!$preview)
    makepoly(ldraw_lib__s__3001s02(), step=step, col=col, unit=unit, alt=alt, line=line, solid=solid);
ldraw_lib__s__3001s02(line=0.2);
// file: ../p/4-4ndis.scad
use <../lib.scad>
function ldraw_lib__4_4ndis() = [
// 0 Disc Negative 1.0
// 0 Name: 4-4ndis.dat
// 0 Author: James Jessiman
// 0 !LDRAW_ORG Primitive UPDATE 2012-01
// 0 !LICENSE Licensed under CC BY 2.0 and CC BY 4.0 : see CAreadme.txt
// 
// 0 BFC CERTIFY CCW
  [0,"BFC","CERTIFY"],
  [0,"BFC","CCW"],
// 
// 0 !HISTORY 2002-03-23 [sbliss] Added BFC statement; compacted code
// 0 !HISTORY 2002-04-25 [PTadmin] Official Update 2002-02
// 0 !HISTORY 2007-06-24 [PTadmin] Header formatted for Contributor Agreement
// 0 !HISTORY 2008-07-01 [PTadmin] Official Update 2008-01
// 0 !HISTORY 2012-02-16 [Philo] Changed to CCW
// 0 !HISTORY 2012-03-30 [PTadmin] Official Update 2012-01
// 
// 
// 3 16 0.9239 0 0.3827 1 0 0 1 0 1
  [3,16,0.9239,0,0.3827,1,0,0,1,0,1],
// 3 16 0.7071 0 0.7071 0.9239 0 0.3827 1 0 1
  [3,16,0.7071,0,0.7071,0.9239,0,0.3827,1,0,1],
// 3 16 0.3827 0 0.9239 0.7071 0 0.7071 1 0 1
  [3,16,0.3827,0,0.9239,0.7071,0,0.7071,1,0,1],
// 3 16 0 0 1 0.3827 0 0.9239 1 0 1
  [3,16,0,0,1,0.3827,0,0.9239,1,0,1],
// 3 16 -0.3827 0 0.9239 0 0 1 -1 0 1
  [3,16,-0.3827,0,0.9239,0,0,1,-1,0,1],
// 3 16 -0.7071 0 0.7071 -0.3827 0 0.9239 -1 0 1
  [3,16,-0.7071,0,0.7071,-0.3827,0,0.9239,-1,0,1],
// 3 16 -0.9239 0 0.3827 -0.7071 0 0.7071 -1 0 1
  [3,16,-0.9239,0,0.3827,-0.7071,0,0.7071,-1,0,1],
// 3 16 -1 0 0 -0.9239 0 0.3827 -1 0 1
  [3,16,-1,0,0,-0.9239,0,0.3827,-1,0,1],
// 3 16 -0.9239 0 -0.3827 -1 0 0 -1 0 -1
  [3,16,-0.9239,0,-0.3827,-1,0,0,-1,0,-1],
// 3 16 -0.7071 0 -0.7071 -0.9239 0 -0.3827 -1 0 -1
  [3,16,-0.7071,0,-0.7071,-0.9239,0,-0.3827,-1,0,-1],
// 3 16 -0.3827 0 -0.9239 -0.7071 0 -0.7071 -1 0 -1
  [3,16,-0.3827,0,-0.9239,-0.7071,0,-0.7071,-1,0,-1],
// 3 16 0 0 -1 -0.3827 0 -0.9239 -1 0 -1
  [3,16,0,0,-1,-0.3827,0,-0.9239,-1,0,-1],
// 3 16 0.3827 0 -0.9239 0 0 -1 1 0 -1
  [3,16,0.3827,0,-0.9239,0,0,-1,1,0,-1],
// 3 16 0.7071 0 -0.7071 0.3827 0 -0.9239 1 0 -1
  [3,16,0.7071,0,-0.7071,0.3827,0,-0.9239,1,0,-1],
// 3 16 0.9239 0 -0.3827 0.7071 0 -0.7071 1 0 -1
  [3,16,0.9239,0,-0.3827,0.7071,0,-0.7071,1,0,-1],
// 3 16 1 0 0 0.9239 0 -0.3827 1 0 -1
  [3,16,1,0,0,0.9239,0,-0.3827,1,0,-1],
];
module ldraw_lib__4_4ndis(step=0, col=false, unit=2/5, alt=false, line=0.2, solid=!$preview)
    makepoly(ldraw_lib__4_4ndis(), step=step, col=col, unit=unit, alt=alt, line=line, solid=solid);
ldraw_lib__4_4ndis(line=0.2);
// file: ../p/4-4disc.scad
use <../lib.scad>
function ldraw_lib__4_4disc() = [
// 0 Disc 1.0
// 0 Name: 4-4disc.dat
// 0 Author: James Jessiman
// 0 !LDRAW_ORG Primitive UPDATE 2002-02
// 0 !LICENSE Licensed under CC BY 2.0 and CC BY 4.0 : see CAreadme.txt
// 
// 0 BFC CERTIFY CCW
  [0,"BFC","CERTIFY"],
  [0,"BFC","CCW"],
// 
// 0 !HISTORY 1998-12-15 [PTadmin] Official Update 1998-10
// 0 !HISTORY 2002-03-23 [sbliss] Added BFC statement
// 0 !HISTORY 2002-04-25 [PTadmin] Official Update 2002-02
// 0 !HISTORY 2007-06-24 [PTadmin] Header formatted for Contributor Agreement
// 0 !HISTORY 2008-07-01 [PTadmin] Official Update 2008-01
// 
// 
// 3 16 0 0 0 1 0 0 0.9239 0 0.3827
  [3,16,0,0,0,1,0,0,0.9239,0,0.3827],
// 3 16 0 0 0 0.9239 0 0.3827 0.7071 0 0.7071
  [3,16,0,0,0,0.9239,0,0.3827,0.7071,0,0.7071],
// 3 16 0 0 0 0.7071 0 0.7071 0.3827 0 0.9239
  [3,16,0,0,0,0.7071,0,0.7071,0.3827,0,0.9239],
// 3 16 0 0 0 0.3827 0 0.9239 0 0 1
  [3,16,0,0,0,0.3827,0,0.9239,0,0,1],
// 3 16 0 0 0 0 0 1 -0.3827 0 0.9239
  [3,16,0,0,0,0,0,1,-0.3827,0,0.9239],
// 3 16 0 0 0 -0.3827 0 0.9239 -0.7071 0 0.7071
  [3,16,0,0,0,-0.3827,0,0.9239,-0.7071,0,0.7071],
// 3 16 0 0 0 -0.7071 0 0.7071 -0.9239 0 0.3827
  [3,16,0,0,0,-0.7071,0,0.7071,-0.9239,0,0.3827],
// 3 16 0 0 0 -0.9239 0 0.3827 -1 0 -0
  [3,16,0,0,0,-0.9239,0,0.3827,-1,0,-0],
// 3 16 0 0 0 -1 0 -0 -0.9239 0 -0.3827
  [3,16,0,0,0,-1,0,-0,-0.9239,0,-0.3827],
// 3 16 0 0 0 -0.9239 0 -0.3827 -0.7071 0 -0.7071
  [3,16,0,0,0,-0.9239,0,-0.3827,-0.7071,0,-0.7071],
// 3 16 0 0 0 -0.7071 0 -0.7071 -0.3827 0 -0.9239
  [3,16,0,0,0,-0.7071,0,-0.7071,-0.3827,0,-0.9239],
// 3 16 0 0 0 -0.3827 0 -0.9239 0 0 -1
  [3,16,0,0,0,-0.3827,0,-0.9239,0,0,-1],
// 3 16 0 0 0 0 0 -1 0.3827 0 -0.9239
  [3,16,0,0,0,0,0,-1,0.3827,0,-0.9239],
// 3 16 0 0 0 0.3827 0 -0.9239 0.7071 0 -0.7071
  [3,16,0,0,0,0.3827,0,-0.9239,0.7071,0,-0.7071],
// 3 16 0 0 0 0.7071 0 -0.7071 0.9239 0 -0.3827
  [3,16,0,0,0,0.7071,0,-0.7071,0.9239,0,-0.3827],
// 3 16 0 0 0 0.9239 0 -0.3827 1 0 0
  [3,16,0,0,0,0.9239,0,-0.3827,1,0,0],
// 0
];
module ldraw_lib__4_4disc(step=0, col=false, unit=2/5, alt=false, line=0.2, solid=!$preview)
    makepoly(ldraw_lib__4_4disc(), step=step, col=col, unit=unit, alt=alt, line=line, solid=solid);
ldraw_lib__4_4disc(line=0.2);
// main file
use <../lib.scad>
use <../p/4-4disc.scad>
use <../p/4-4ndis.scad>
use <s/3001s02.scad>
use <../p/stud.scad>
function ldraw_lib__60237p01() = [
// 0 Brick Braille 2 x 4 with 2 Studs (DOTS-34) with "÷" Pattern
// 0 Name: 60237p01.dat
// 0 Author: Rene Rechthaler [Blechtaler]
// 0 !LDRAW_ORG Part UPDATE 2025-08
// 0 !LICENSE Licensed under CC BY 4.0 : see CAreadme.txt
// 
// 0 BFC CERTIFY CCW
  [0,"BFC","CERTIFY"],
  [0,"BFC","CCW"],
// 
// 0 !KEYWORDS ⠌ Unicode U+280C (10252), Bricklink 60237pb01, division
// 0 !KEYWORDS Rebrickable 60237pr0001, Set 4000503, set 40656
// 
// 0 !HISTORY 2025-08-31 [OrionP] Official Update 2025-08
// 
// 1 16 0 0 0 1 0 0 0 1 0 0 0 1 s\3001s02.dat
  [1,16,0,0,0,1,0,0,0,1,0,0,0,1, ldraw_lib__s__3001s02()],
// 1 16 -30 0 10 1 0 0 0 1 0 0 0 1 stud.dat
  [1,16,-30,0,10,1,0,0,0,1,0,0,0,1, ldraw_lib__stud()],
// 1 16 10 0 -10 1 0 0 0 1 0 0 0 1 stud.dat
  [1,16,10,0,-10,1,0,0,0,1,0,0,0,1, ldraw_lib__stud()],
// 
// 0 // Pattern
// 0 // Character
// 1 0 27.85 0 0 0 0 -.85 0 1 0 .9 0 0 4-4disc.dat
  [1,0,27.85,0,0,0,0,-.85,0,1,0,.9,0,0, ldraw_lib__4_4disc()],
// 1 0 32.7 0 0 0 0 -.85 0 1 0 .9 0 0 4-4disc.dat
  [1,0,32.7,0,0,0,0,-.85,0,1,0,.9,0,0, ldraw_lib__4_4disc()],
// 4 0 30.85 0 3 29.7 0 3 29.7 0 -3 30.85 0 -3
  [4,0,30.85,0,3,29.7,0,3,29.7,0,-3,30.85,0,-3],
// 0 // Background
// 1 16 27.85 0 0 0 0 -.85 0 1 0 .9 0 0 4-4ndis.dat
  [1,16,27.85,0,0,0,0,-.85,0,1,0,.9,0,0, ldraw_lib__4_4ndis()],
// 1 16 32.7 0 0 0 0 -.85 0 1 0 .9 0 0 4-4ndis.dat
  [1,16,32.7,0,0,0,0,-.85,0,1,0,.9,0,0, ldraw_lib__4_4ndis()],
// 4 16 40 0 -20 33.55 0 -.9 32.7 0 -.9 30.85 0 -3
  [4,16,40,0,-20,33.55,0,-.9,32.7,0,-.9,30.85,0,-3],
// 3 16 30.85 0 -3 32.7 0 -.9 31.85 0 -.9
  [3,16,30.85,0,-3,32.7,0,-.9,31.85,0,-.9],
// 4 16 30.85 0 3 30.85 0 -3 31.85 0 -.9 31.85 0 0
  [4,16,30.85,0,3,30.85,0,-3,31.85,0,-.9,31.85,0,0],
// 3 16 28.7 0 -.9 27.85 0 -.9 29.7 0 -3
  [3,16,28.7,0,-.9,27.85,0,-.9,29.7,0,-3],
// 4 16 -40 0 -20 29.7 0 -3 27.85 0 -.9 27 0 -.9
  [4,16,-40,0,-20,29.7,0,-3,27.85,0,-.9,27,0,-.9],
// 4 16 29.7 0 3 28.7 0 0 28.7 0 -.9 29.7 0 -3
  [4,16,29.7,0,3,28.7,0,0,28.7,0,-.9,29.7,0,-3],
// 4 16 40 0 20 30.85 0 3 32.7 0 .9 33.55 0 .9
  [4,16,40,0,20,30.85,0,3,32.7,0,.9,33.55,0,.9],
// 3 16 31.85 0 .9 32.7 0 .9 30.85 0 3
  [3,16,31.85,0,.9,32.7,0,.9,30.85,0,3],
// 3 16 31.85 0 .9 30.85 0 3 31.85 0 0
  [3,16,31.85,0,.9,30.85,0,3,31.85,0,0],
// 3 16 29.7 0 3 28.7 0 .9 28.7 0 0
  [3,16,29.7,0,3,28.7,0,.9,28.7,0,0],
// 4 16 -40 0 20 27 0 .9 27.85 0 .9 29.7 0 3
  [4,16,-40,0,20,27,0,.9,27.85,0,.9,29.7,0,3],
// 3 16 27.85 0 .9 28.7 0 .9 29.7 0 3
  [3,16,27.85,0,.9,28.7,0,.9,29.7,0,3],
// 4 16 40 0 20 33.55 0 0 33.55 0 -.9 40 0 -20
  [4,16,40,0,20,33.55,0,0,33.55,0,-.9,40,0,-20],
// 4 16 29.7 0 -3 -40 0 -20 40 0 -20 30.85 0 -3
  [4,16,29.7,0,-3,-40,0,-20,40,0,-20,30.85,0,-3],
// 4 16 -40 0 20 -40 0 -20 27 0 -.9 27 0 0
  [4,16,-40,0,20,-40,0,-20,27,0,-.9,27,0,0],
// 4 16 40 0 20 -40 0 20 29.7 0 3 30.85 0 3
  [4,16,40,0,20,-40,0,20,29.7,0,3,30.85,0,3],
// 3 16 40 0 20 33.55 0 .9 33.55 0 0
  [3,16,40,0,20,33.55,0,.9,33.55,0,0],
// 3 16 27 0 .9 -40 0 20 27 0 0
  [3,16,27,0,.9,-40,0,20,27,0,0],
];
module ldraw_lib__60237p01(step=0, col=false, unit=2/5, alt=false, line=0.2, solid=!$preview)
    makepoly(ldraw_lib__60237p01(), step=step, col=col, unit=unit, alt=alt, line=line, solid=solid);
ldraw_lib__60237p01(line=0.2);
